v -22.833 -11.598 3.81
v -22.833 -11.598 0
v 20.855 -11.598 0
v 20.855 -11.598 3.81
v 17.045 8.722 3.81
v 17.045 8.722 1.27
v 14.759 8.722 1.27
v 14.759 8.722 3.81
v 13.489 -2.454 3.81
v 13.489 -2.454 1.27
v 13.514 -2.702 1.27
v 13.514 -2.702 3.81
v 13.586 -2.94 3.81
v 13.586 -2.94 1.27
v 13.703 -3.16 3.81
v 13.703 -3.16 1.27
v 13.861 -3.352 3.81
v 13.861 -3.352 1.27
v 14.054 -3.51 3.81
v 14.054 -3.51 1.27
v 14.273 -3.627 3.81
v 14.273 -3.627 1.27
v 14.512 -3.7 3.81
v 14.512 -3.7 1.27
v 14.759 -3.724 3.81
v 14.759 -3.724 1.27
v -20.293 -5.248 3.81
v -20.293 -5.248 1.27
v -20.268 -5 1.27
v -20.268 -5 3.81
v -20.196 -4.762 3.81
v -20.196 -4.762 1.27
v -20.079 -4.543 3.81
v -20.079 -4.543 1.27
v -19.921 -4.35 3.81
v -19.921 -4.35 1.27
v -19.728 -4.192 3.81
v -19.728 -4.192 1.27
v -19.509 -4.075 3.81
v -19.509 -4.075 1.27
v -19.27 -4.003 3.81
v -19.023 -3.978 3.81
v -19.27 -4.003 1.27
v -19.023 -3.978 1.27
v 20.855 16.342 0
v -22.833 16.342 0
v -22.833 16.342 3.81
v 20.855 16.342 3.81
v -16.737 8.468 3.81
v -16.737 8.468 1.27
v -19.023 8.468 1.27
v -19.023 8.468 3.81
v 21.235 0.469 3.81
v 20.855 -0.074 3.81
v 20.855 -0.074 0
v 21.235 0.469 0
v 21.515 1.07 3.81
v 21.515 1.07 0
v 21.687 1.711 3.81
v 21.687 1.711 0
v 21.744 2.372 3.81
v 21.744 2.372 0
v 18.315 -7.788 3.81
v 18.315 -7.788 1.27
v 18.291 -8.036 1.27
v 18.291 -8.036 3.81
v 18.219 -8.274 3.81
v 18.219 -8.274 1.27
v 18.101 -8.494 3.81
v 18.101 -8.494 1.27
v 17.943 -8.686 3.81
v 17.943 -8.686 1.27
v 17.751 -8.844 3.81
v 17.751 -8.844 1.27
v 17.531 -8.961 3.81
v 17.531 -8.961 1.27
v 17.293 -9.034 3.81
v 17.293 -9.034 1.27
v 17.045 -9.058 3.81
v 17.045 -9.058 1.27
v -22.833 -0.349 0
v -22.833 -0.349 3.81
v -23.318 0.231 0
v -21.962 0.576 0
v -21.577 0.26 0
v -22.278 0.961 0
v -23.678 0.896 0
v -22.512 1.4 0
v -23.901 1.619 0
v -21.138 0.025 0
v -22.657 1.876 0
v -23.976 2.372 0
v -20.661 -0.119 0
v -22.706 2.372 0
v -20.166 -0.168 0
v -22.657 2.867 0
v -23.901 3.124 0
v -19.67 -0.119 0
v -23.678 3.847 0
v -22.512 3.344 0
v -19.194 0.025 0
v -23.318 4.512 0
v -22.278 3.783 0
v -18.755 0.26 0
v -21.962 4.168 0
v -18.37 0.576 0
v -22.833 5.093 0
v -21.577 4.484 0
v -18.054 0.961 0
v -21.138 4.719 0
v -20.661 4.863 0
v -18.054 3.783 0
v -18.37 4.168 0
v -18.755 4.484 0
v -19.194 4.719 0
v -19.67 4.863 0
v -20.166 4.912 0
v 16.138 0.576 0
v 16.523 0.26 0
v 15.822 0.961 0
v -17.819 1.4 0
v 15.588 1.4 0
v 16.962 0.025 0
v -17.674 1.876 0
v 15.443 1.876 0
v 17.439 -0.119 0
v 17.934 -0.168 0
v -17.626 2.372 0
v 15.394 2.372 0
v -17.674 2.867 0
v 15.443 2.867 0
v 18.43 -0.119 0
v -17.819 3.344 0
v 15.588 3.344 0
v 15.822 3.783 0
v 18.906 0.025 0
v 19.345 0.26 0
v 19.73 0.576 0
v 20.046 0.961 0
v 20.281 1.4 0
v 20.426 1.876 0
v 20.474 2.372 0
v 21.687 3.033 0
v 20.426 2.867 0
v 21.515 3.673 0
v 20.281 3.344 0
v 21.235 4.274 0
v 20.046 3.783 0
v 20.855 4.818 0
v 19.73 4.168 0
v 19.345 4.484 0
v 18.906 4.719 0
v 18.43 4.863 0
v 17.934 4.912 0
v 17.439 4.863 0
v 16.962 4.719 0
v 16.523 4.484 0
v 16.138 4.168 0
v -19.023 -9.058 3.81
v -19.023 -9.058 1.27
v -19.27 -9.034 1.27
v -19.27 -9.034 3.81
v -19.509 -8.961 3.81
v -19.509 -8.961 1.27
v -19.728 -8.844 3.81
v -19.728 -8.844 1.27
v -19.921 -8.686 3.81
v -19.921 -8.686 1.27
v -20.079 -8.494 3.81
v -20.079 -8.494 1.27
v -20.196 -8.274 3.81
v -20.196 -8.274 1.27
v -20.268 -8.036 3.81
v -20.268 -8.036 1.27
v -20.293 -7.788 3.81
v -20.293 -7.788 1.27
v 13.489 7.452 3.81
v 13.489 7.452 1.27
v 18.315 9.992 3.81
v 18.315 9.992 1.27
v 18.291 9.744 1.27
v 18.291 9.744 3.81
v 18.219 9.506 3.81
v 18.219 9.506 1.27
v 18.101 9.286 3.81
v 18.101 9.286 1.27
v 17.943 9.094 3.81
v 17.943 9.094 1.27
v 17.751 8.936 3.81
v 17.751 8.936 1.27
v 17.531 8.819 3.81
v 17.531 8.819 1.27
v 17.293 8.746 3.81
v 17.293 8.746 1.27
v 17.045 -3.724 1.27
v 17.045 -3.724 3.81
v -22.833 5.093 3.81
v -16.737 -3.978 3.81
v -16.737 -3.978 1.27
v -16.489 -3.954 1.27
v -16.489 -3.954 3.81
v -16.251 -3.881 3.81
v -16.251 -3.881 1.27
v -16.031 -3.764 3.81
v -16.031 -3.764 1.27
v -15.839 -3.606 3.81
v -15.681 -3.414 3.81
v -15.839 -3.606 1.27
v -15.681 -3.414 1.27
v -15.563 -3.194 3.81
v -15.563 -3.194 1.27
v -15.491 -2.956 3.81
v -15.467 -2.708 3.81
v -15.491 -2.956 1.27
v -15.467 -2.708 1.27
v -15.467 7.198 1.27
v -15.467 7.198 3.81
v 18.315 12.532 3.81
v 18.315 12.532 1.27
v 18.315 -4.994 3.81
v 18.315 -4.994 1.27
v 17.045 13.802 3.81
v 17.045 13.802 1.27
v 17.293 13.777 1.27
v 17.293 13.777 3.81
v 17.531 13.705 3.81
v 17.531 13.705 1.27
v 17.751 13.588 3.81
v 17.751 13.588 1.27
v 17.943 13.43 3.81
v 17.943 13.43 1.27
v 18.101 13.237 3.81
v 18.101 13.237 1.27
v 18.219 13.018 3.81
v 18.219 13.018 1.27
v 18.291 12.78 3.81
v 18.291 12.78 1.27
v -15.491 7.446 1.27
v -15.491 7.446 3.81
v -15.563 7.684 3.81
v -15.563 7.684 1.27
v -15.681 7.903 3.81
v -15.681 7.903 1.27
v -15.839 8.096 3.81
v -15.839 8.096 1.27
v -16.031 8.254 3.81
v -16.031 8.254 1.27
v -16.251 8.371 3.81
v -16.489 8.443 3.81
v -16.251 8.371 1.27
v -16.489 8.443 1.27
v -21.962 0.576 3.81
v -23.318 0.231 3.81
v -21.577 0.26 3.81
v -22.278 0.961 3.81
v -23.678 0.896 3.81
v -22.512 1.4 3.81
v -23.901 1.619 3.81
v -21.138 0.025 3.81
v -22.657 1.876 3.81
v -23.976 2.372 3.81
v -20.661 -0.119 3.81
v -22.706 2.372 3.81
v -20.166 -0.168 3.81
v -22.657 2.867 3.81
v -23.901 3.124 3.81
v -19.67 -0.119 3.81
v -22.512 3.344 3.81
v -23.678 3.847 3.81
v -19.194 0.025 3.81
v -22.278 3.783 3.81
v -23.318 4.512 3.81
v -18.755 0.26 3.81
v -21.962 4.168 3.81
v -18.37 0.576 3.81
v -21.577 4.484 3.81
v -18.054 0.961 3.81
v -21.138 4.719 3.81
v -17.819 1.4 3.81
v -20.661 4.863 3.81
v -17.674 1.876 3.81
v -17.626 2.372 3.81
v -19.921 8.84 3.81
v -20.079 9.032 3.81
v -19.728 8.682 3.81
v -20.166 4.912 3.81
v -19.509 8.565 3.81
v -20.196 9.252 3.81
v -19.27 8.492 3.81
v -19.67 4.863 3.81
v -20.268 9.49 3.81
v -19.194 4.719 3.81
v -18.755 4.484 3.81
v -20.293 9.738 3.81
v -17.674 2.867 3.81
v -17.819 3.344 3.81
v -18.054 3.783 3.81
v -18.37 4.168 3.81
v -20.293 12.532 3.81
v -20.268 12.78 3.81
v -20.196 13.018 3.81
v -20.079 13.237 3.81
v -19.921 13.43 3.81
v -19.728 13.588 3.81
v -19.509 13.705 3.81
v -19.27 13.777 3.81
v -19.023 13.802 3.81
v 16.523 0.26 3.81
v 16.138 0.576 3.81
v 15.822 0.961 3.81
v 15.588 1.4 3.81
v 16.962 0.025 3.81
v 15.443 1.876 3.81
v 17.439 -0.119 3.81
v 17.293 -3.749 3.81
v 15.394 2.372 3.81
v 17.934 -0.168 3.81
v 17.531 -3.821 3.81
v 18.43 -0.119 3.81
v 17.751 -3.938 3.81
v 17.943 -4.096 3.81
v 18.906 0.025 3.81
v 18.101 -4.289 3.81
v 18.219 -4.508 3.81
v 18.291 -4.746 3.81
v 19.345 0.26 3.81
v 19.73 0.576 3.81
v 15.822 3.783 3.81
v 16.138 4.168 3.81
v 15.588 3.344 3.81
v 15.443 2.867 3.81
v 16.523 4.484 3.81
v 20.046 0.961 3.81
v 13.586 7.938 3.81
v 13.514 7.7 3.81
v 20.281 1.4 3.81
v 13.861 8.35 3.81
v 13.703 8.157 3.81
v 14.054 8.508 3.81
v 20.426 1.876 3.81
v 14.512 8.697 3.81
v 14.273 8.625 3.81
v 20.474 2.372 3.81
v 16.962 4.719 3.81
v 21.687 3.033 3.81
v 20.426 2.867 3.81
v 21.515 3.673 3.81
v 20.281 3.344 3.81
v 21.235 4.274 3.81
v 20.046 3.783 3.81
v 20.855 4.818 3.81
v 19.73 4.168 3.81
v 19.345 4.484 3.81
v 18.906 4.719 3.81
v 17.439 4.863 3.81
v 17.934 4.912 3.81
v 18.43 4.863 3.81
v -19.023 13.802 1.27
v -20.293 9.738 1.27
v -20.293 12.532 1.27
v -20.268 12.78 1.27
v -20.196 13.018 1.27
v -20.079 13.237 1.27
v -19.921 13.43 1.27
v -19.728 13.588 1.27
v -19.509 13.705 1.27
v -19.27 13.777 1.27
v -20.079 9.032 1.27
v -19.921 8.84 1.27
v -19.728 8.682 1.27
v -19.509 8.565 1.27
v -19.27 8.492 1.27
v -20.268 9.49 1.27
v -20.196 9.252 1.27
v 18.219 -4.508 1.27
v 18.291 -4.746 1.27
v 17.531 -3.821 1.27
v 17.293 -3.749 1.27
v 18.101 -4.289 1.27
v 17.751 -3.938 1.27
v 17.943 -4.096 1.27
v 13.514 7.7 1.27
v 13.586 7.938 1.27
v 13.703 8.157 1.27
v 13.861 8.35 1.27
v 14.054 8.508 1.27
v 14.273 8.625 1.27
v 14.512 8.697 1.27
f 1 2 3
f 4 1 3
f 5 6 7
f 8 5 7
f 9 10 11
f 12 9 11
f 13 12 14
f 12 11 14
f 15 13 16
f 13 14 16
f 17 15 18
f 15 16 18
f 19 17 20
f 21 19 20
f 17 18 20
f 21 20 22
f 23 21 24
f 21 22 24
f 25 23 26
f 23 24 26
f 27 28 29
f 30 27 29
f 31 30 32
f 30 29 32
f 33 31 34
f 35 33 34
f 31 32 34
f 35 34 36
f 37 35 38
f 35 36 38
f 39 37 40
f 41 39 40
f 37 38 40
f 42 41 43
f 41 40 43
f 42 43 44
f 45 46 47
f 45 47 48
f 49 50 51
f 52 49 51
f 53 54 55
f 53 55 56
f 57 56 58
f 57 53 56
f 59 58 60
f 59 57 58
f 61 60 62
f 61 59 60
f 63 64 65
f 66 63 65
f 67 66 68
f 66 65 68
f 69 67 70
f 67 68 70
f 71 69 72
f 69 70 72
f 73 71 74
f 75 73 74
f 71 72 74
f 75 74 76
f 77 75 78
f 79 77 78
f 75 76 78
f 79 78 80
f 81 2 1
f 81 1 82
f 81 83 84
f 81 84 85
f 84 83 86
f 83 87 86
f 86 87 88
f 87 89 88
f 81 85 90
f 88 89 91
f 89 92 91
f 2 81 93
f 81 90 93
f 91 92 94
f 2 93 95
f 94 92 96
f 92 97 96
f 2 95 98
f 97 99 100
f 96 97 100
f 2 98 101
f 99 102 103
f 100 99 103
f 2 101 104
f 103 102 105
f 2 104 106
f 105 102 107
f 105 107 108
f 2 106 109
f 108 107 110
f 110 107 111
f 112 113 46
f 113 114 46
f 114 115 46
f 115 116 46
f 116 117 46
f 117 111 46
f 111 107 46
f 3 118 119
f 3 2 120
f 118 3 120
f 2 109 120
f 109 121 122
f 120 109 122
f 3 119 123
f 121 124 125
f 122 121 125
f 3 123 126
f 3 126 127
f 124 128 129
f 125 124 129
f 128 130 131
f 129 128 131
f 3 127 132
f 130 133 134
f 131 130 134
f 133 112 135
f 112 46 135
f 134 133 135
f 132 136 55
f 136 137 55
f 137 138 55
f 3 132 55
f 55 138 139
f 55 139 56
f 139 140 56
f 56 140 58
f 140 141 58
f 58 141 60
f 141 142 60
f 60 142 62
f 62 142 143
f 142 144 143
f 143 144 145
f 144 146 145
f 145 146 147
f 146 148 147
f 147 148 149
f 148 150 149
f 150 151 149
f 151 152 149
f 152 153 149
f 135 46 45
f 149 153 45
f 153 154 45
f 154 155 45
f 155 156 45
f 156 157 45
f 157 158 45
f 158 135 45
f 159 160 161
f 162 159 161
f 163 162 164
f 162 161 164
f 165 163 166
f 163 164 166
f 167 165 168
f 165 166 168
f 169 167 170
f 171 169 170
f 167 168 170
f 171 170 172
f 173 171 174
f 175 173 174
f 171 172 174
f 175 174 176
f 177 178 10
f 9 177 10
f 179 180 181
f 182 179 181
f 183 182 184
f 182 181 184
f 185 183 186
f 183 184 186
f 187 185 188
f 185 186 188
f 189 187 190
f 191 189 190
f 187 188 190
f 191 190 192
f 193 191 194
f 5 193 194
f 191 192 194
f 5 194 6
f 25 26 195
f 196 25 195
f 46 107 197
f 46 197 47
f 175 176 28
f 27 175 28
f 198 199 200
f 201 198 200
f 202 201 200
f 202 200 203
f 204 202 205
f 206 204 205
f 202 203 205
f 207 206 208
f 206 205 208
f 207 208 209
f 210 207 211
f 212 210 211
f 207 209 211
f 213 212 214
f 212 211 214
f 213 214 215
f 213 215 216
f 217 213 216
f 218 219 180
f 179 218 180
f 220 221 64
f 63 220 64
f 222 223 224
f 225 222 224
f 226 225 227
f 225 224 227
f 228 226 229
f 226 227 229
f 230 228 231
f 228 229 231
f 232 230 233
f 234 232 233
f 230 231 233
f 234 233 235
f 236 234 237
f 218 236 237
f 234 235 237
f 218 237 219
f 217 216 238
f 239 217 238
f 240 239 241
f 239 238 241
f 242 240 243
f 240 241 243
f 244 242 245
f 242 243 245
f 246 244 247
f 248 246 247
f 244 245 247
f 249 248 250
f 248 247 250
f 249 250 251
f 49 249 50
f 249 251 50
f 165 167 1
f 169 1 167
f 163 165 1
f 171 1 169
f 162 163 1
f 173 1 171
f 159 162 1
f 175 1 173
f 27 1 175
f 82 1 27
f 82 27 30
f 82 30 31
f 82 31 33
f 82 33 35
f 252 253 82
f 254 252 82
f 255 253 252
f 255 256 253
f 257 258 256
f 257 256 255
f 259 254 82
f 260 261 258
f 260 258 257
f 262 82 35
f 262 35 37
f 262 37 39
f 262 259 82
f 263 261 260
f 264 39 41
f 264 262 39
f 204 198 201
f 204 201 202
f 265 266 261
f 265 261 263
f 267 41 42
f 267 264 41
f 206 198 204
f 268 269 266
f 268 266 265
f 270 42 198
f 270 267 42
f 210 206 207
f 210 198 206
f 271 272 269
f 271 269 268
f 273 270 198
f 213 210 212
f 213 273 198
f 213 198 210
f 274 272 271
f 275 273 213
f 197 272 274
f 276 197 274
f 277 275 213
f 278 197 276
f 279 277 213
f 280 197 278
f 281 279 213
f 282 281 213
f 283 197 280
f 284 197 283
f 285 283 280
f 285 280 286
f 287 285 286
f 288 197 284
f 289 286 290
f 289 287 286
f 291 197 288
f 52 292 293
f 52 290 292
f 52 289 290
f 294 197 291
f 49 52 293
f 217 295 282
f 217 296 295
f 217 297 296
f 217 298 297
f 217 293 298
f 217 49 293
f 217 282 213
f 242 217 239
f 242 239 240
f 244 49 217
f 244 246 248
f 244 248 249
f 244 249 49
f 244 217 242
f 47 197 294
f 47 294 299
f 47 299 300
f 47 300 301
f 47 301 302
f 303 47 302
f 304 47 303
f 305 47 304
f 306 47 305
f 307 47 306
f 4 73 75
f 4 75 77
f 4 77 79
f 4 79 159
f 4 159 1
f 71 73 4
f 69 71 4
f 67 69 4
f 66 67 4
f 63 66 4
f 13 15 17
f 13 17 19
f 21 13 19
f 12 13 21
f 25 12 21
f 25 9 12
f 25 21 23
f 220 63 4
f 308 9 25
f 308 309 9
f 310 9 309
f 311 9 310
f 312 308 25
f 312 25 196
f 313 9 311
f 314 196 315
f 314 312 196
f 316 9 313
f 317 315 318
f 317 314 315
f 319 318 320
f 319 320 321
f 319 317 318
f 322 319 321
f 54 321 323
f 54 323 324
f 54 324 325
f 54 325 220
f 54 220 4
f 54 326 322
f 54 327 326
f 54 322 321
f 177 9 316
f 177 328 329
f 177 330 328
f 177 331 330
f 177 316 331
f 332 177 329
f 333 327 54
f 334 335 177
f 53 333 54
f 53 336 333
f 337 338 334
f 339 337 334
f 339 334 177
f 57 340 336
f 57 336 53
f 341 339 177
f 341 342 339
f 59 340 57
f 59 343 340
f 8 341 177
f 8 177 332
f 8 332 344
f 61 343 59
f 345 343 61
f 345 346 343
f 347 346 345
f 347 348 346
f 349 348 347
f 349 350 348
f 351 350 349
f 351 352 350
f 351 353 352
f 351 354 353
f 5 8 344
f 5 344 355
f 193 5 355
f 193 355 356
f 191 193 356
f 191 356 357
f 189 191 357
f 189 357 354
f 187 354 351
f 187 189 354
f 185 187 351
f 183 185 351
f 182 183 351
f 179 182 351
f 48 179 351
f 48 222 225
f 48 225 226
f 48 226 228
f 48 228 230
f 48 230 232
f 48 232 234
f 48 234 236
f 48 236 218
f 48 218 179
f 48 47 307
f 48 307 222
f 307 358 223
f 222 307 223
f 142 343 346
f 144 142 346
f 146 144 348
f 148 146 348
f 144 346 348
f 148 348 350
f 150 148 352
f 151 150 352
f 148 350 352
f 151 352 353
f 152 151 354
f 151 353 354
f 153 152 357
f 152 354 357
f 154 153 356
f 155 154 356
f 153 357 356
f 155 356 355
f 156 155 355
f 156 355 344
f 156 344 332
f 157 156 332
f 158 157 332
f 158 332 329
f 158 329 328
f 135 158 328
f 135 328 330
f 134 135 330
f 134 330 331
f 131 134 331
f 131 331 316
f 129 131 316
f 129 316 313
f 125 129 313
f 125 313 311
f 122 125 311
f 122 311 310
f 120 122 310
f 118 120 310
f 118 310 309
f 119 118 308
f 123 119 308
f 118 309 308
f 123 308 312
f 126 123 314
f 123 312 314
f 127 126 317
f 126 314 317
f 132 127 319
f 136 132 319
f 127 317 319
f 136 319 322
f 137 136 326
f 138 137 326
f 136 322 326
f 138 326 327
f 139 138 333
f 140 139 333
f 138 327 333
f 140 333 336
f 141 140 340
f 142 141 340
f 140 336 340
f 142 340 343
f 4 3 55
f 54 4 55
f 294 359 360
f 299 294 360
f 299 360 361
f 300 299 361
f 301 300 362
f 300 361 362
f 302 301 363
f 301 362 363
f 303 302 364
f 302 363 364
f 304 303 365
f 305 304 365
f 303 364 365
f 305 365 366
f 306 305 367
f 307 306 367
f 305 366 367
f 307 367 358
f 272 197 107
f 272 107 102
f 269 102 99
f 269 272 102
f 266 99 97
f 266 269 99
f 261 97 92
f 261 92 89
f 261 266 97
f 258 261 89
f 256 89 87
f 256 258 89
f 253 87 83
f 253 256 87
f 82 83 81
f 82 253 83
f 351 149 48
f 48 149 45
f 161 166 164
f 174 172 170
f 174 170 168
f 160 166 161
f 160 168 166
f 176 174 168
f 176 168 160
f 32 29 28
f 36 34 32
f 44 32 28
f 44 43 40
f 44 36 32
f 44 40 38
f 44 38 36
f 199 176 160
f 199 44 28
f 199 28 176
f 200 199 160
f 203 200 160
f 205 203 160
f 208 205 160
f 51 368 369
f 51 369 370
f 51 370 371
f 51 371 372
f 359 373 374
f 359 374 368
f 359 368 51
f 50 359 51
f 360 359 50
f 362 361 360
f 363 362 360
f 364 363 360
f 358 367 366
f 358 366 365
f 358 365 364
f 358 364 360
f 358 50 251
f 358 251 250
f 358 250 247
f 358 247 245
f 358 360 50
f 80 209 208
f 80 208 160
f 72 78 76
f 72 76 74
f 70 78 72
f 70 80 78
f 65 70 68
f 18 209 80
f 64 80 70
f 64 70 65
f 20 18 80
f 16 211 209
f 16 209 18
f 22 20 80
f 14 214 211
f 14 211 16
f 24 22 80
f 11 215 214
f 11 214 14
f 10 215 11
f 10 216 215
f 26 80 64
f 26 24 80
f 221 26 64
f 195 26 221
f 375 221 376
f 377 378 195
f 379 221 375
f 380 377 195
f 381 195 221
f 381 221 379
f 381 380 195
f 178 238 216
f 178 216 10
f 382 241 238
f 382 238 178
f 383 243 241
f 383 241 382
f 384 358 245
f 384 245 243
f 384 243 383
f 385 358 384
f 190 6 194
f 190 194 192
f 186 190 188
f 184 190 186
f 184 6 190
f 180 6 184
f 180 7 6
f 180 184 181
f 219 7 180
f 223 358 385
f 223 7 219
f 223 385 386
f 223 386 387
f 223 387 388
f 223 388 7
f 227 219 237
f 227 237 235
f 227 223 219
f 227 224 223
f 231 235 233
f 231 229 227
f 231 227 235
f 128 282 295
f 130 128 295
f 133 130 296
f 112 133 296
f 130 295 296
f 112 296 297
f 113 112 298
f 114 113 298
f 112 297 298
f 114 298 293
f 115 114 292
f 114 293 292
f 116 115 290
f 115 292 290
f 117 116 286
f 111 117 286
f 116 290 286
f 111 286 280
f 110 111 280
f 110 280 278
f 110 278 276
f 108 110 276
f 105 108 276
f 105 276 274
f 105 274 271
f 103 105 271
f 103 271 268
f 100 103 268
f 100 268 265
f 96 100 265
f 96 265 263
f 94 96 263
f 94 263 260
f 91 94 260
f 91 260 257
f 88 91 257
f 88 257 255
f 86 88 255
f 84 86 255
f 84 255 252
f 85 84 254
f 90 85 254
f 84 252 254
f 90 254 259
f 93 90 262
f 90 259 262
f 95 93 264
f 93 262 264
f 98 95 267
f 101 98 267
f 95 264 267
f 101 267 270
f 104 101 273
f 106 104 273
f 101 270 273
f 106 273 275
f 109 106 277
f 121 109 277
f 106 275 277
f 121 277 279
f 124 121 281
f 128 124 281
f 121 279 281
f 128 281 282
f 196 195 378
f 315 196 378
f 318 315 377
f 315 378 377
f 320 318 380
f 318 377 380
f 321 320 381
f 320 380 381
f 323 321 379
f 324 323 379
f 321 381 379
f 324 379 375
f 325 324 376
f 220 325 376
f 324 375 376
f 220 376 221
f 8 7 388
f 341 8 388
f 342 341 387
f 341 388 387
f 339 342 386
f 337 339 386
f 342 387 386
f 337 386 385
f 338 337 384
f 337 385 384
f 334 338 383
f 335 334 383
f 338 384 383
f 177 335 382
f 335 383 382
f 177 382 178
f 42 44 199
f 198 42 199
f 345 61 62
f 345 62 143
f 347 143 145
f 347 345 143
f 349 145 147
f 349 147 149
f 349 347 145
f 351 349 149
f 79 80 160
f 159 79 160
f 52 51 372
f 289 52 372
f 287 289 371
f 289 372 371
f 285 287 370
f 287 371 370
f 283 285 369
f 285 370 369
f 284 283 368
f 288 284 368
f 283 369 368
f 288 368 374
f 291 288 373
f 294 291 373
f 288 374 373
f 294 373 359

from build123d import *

# Parameters (mm, degrees)
F0_W     = 43.688
F0_H     = 27.94
F1_DEPTH = 3.81
F2_DEPTH = 1.27
F4_DEPTH = 3.81
F3_R     = 2.54
F5_DEPTH = 25.4


with BuildPart() as f1:
    # F0 (on Top) → F1 (new body)
    with BuildSketch(Plane.XY):
        with Locations((-0.9886939079, 2.3718496937)):
            Rectangle(F0_W, F0_H)
        with BuildLine():
            ThreePointArc((-20.2926939079, 12.5318496937), (-19.92071952, 13.4298753058), (-19.0226939079, 13.8018496937))
            Line((-19.0226939079, 13.8018496937), (17.0453060921, 13.8018496937))
            ThreePointArc((17.0453060921, 13.8018496937), (17.9433317042, 13.4298753058), (18.3153060921, 12.5318496937))
            Line((18.3153060921, 12.5318496937), (18.3153060921, 9.9918496937))
            ThreePointArc((18.3153060921, 9.9918496937), (17.9433317042, 9.0938240816), (17.0453060921, 8.7218496937))
            Line((17.0453060921, 8.7218496937), (14.7593060921, 8.7218496937))
            ThreePointArc((14.7593060921, 8.7218496937), (13.86128048, 8.3498753058), (13.4893060921, 7.4518496937))
            Line((13.4893060921, 7.4518496937), (13.4893060921, -2.4541503063))
            ThreePointArc((13.4893060921, -2.4541503063), (13.86128048, -3.3521759184), (14.7593060921, -3.7241503063))
            Line((14.7593060921, -3.7241503063), (17.0453060921, -3.7241503063))
            ThreePointArc((17.0453060921, -3.7241503063), (17.9433317042, -4.0961246942), (18.3153060921, -4.9941503063))
            Line((18.3153060921, -4.9941503063), (18.3153060921, -7.7881503063))
            ThreePointArc((18.3153060921, -7.7881503063), (17.9433317042, -8.6861759184), (17.0453060921, -9.0581503063))
            Line((17.0453060921, -9.0581503063), (-19.0226939079, -9.0581503063))
            ThreePointArc((-19.0226939079, -9.0581503063), (-19.92071952, -8.6861759184), (-20.2926939079, -7.7881503063))
            Line((-20.2926939079, -7.7881503063), (-20.2926939079, -5.2481503063))
            ThreePointArc((-20.2926939079, -5.2481503063), (-19.92071952, -4.3501246942), (-19.0226939079, -3.9781503063))
            Line((-19.0226939079, -3.9781503063), (-16.7366939079, -3.9781503063))
            ThreePointArc((-16.7366939079, -3.9781503063), (-15.8386682958, -3.6061759184), (-15.4666939079, -2.7081503063))
            Line((-15.4666939079, -2.7081503063), (-15.4666939079, 7.1978496937))
            ThreePointArc((-15.4666939079, 7.1978496937), (-15.8386682958, 8.0958753058), (-16.7366939079, 8.4678496937))
            Line((-16.7366939079, 8.4678496937), (-19.0226939079, 8.4678496937))
            ThreePointArc((-19.0226939079, 8.4678496937), (-19.92071952, 8.8398240816), (-20.2926939079, 9.7378496937))
            Line((-20.2926939079, 9.7378496937), (-20.2926939079, 12.5318496937))
        make_face(mode=Mode.SUBTRACT)
    extrude(amount=F1_DEPTH)

    # F0 (on Top) → F2 (join)
    with BuildSketch(Plane.XY):
        with BuildLine():
            Line((17.0453060921, 13.8018496937), (-19.0226939079, 13.8018496937))
            ThreePointArc((-19.0226939079, 13.8018496937), (-19.92071952, 13.4298753058), (-20.2926939079, 12.5318496937))
            Line((-20.2926939079, 12.5318496937), (-20.2926939079, 9.7378496937))
            ThreePointArc((-20.2926939079, 9.7378496937), (-19.92071952, 8.8398240816), (-19.0226939079, 8.4678496937))
            Line((-19.0226939079, 8.4678496937), (-16.7366939079, 8.4678496937))
            ThreePointArc((-16.7366939079, 8.4678496937), (-15.8386682958, 8.0958753058), (-15.4666939079, 7.1978496937))
            Line((-15.4666939079, 7.1978496937), (-15.4666939079, -2.7081503063))
            ThreePointArc((-15.4666939079, -2.7081503063), (-15.8386682958, -3.6061759184), (-16.7366939079, -3.9781503063))
            Line((-16.7366939079, -3.9781503063), (-19.0226939079, -3.9781503063))
            ThreePointArc((-19.0226939079, -3.9781503063), (-19.92071952, -4.3501246942), (-20.2926939079, -5.2481503063))
            Line((-20.2926939079, -5.2481503063), (-20.2926939079, -7.7881503063))
            ThreePointArc((-20.2926939079, -7.7881503063), (-19.92071952, -8.6861759184), (-19.0226939079, -9.0581503063))
            Line((-19.0226939079, -9.0581503063), (17.0453060921, -9.0581503063))
            ThreePointArc((17.0453060921, -9.0581503063), (17.9433317042, -8.6861759184), (18.3153060921, -7.7881503063))
            Line((18.3153060921, -7.7881503063), (18.3153060921, -4.9941503063))
            ThreePointArc((18.3153060921, -4.9941503063), (17.9433317042, -4.0961246942), (17.0453060921, -3.7241503063))
            Line((17.0453060921, -3.7241503063), (14.7593060921, -3.7241503063))
            ThreePointArc((14.7593060921, -3.7241503063), (13.86128048, -3.3521759184), (13.4893060921, -2.4541503063))
            Line((13.4893060921, -2.4541503063), (13.4893060921, 7.4518496937))
            ThreePointArc((13.4893060921, 7.4518496937), (13.86128048, 8.3498753058), (14.7593060921, 8.7218496937))
            Line((14.7593060921, 8.7218496937), (17.0453060921, 8.7218496937))
            ThreePointArc((17.0453060921, 8.7218496937), (17.9433317042, 9.0938240816), (18.3153060921, 9.9918496937))
            Line((18.3153060921, 9.9918496937), (18.3153060921, 12.5318496937))
            ThreePointArc((18.3153060921, 12.5318496937), (17.9433317042, 13.4298753058), (17.0453060921, 13.8018496937))
        make_face()
    extrude(amount=F2_DEPTH)

    # F3 (on face) → F4 (join)
    with BuildSketch(Plane.XY.offset(3.81)):
        with BuildLine():
            Line((-22.8326939079, -0.3490345376), (-22.8326939079, 5.092733925))
            ThreePointArc((-22.8326939079, 5.092733925), (-23.9756939079, 2.3718496937), (-22.8326939079, -0.3490345376))
        make_face()
        with BuildLine():
            ThreePointArc((21.7443060921, 2.3718496937), (21.5151656258, 3.673212441), (20.8553060921, 4.8180424498))
            Line((20.8553060921, 4.8180424498), (20.8553060921, -0.0743430624))
            ThreePointArc((20.8553060921, -0.0743430624), (21.5151656258, 1.0704869464), (21.7443060921, 2.3718496937))
        make_face()
    extrude(amount=-F4_DEPTH)

    # F3 (on face) → F5 (cut)
    with BuildSketch(Plane.XY.offset(3.81)):
        with Locations((-20.1656939079, 2.3718496937)):
            Circle(F3_R)
        with Locations((17.9343060921, 2.3718496937)):
            Circle(F3_R)
    extrude(amount=-F5_DEPTH, mode=Mode.SUBTRACT)


solid = f1.part
